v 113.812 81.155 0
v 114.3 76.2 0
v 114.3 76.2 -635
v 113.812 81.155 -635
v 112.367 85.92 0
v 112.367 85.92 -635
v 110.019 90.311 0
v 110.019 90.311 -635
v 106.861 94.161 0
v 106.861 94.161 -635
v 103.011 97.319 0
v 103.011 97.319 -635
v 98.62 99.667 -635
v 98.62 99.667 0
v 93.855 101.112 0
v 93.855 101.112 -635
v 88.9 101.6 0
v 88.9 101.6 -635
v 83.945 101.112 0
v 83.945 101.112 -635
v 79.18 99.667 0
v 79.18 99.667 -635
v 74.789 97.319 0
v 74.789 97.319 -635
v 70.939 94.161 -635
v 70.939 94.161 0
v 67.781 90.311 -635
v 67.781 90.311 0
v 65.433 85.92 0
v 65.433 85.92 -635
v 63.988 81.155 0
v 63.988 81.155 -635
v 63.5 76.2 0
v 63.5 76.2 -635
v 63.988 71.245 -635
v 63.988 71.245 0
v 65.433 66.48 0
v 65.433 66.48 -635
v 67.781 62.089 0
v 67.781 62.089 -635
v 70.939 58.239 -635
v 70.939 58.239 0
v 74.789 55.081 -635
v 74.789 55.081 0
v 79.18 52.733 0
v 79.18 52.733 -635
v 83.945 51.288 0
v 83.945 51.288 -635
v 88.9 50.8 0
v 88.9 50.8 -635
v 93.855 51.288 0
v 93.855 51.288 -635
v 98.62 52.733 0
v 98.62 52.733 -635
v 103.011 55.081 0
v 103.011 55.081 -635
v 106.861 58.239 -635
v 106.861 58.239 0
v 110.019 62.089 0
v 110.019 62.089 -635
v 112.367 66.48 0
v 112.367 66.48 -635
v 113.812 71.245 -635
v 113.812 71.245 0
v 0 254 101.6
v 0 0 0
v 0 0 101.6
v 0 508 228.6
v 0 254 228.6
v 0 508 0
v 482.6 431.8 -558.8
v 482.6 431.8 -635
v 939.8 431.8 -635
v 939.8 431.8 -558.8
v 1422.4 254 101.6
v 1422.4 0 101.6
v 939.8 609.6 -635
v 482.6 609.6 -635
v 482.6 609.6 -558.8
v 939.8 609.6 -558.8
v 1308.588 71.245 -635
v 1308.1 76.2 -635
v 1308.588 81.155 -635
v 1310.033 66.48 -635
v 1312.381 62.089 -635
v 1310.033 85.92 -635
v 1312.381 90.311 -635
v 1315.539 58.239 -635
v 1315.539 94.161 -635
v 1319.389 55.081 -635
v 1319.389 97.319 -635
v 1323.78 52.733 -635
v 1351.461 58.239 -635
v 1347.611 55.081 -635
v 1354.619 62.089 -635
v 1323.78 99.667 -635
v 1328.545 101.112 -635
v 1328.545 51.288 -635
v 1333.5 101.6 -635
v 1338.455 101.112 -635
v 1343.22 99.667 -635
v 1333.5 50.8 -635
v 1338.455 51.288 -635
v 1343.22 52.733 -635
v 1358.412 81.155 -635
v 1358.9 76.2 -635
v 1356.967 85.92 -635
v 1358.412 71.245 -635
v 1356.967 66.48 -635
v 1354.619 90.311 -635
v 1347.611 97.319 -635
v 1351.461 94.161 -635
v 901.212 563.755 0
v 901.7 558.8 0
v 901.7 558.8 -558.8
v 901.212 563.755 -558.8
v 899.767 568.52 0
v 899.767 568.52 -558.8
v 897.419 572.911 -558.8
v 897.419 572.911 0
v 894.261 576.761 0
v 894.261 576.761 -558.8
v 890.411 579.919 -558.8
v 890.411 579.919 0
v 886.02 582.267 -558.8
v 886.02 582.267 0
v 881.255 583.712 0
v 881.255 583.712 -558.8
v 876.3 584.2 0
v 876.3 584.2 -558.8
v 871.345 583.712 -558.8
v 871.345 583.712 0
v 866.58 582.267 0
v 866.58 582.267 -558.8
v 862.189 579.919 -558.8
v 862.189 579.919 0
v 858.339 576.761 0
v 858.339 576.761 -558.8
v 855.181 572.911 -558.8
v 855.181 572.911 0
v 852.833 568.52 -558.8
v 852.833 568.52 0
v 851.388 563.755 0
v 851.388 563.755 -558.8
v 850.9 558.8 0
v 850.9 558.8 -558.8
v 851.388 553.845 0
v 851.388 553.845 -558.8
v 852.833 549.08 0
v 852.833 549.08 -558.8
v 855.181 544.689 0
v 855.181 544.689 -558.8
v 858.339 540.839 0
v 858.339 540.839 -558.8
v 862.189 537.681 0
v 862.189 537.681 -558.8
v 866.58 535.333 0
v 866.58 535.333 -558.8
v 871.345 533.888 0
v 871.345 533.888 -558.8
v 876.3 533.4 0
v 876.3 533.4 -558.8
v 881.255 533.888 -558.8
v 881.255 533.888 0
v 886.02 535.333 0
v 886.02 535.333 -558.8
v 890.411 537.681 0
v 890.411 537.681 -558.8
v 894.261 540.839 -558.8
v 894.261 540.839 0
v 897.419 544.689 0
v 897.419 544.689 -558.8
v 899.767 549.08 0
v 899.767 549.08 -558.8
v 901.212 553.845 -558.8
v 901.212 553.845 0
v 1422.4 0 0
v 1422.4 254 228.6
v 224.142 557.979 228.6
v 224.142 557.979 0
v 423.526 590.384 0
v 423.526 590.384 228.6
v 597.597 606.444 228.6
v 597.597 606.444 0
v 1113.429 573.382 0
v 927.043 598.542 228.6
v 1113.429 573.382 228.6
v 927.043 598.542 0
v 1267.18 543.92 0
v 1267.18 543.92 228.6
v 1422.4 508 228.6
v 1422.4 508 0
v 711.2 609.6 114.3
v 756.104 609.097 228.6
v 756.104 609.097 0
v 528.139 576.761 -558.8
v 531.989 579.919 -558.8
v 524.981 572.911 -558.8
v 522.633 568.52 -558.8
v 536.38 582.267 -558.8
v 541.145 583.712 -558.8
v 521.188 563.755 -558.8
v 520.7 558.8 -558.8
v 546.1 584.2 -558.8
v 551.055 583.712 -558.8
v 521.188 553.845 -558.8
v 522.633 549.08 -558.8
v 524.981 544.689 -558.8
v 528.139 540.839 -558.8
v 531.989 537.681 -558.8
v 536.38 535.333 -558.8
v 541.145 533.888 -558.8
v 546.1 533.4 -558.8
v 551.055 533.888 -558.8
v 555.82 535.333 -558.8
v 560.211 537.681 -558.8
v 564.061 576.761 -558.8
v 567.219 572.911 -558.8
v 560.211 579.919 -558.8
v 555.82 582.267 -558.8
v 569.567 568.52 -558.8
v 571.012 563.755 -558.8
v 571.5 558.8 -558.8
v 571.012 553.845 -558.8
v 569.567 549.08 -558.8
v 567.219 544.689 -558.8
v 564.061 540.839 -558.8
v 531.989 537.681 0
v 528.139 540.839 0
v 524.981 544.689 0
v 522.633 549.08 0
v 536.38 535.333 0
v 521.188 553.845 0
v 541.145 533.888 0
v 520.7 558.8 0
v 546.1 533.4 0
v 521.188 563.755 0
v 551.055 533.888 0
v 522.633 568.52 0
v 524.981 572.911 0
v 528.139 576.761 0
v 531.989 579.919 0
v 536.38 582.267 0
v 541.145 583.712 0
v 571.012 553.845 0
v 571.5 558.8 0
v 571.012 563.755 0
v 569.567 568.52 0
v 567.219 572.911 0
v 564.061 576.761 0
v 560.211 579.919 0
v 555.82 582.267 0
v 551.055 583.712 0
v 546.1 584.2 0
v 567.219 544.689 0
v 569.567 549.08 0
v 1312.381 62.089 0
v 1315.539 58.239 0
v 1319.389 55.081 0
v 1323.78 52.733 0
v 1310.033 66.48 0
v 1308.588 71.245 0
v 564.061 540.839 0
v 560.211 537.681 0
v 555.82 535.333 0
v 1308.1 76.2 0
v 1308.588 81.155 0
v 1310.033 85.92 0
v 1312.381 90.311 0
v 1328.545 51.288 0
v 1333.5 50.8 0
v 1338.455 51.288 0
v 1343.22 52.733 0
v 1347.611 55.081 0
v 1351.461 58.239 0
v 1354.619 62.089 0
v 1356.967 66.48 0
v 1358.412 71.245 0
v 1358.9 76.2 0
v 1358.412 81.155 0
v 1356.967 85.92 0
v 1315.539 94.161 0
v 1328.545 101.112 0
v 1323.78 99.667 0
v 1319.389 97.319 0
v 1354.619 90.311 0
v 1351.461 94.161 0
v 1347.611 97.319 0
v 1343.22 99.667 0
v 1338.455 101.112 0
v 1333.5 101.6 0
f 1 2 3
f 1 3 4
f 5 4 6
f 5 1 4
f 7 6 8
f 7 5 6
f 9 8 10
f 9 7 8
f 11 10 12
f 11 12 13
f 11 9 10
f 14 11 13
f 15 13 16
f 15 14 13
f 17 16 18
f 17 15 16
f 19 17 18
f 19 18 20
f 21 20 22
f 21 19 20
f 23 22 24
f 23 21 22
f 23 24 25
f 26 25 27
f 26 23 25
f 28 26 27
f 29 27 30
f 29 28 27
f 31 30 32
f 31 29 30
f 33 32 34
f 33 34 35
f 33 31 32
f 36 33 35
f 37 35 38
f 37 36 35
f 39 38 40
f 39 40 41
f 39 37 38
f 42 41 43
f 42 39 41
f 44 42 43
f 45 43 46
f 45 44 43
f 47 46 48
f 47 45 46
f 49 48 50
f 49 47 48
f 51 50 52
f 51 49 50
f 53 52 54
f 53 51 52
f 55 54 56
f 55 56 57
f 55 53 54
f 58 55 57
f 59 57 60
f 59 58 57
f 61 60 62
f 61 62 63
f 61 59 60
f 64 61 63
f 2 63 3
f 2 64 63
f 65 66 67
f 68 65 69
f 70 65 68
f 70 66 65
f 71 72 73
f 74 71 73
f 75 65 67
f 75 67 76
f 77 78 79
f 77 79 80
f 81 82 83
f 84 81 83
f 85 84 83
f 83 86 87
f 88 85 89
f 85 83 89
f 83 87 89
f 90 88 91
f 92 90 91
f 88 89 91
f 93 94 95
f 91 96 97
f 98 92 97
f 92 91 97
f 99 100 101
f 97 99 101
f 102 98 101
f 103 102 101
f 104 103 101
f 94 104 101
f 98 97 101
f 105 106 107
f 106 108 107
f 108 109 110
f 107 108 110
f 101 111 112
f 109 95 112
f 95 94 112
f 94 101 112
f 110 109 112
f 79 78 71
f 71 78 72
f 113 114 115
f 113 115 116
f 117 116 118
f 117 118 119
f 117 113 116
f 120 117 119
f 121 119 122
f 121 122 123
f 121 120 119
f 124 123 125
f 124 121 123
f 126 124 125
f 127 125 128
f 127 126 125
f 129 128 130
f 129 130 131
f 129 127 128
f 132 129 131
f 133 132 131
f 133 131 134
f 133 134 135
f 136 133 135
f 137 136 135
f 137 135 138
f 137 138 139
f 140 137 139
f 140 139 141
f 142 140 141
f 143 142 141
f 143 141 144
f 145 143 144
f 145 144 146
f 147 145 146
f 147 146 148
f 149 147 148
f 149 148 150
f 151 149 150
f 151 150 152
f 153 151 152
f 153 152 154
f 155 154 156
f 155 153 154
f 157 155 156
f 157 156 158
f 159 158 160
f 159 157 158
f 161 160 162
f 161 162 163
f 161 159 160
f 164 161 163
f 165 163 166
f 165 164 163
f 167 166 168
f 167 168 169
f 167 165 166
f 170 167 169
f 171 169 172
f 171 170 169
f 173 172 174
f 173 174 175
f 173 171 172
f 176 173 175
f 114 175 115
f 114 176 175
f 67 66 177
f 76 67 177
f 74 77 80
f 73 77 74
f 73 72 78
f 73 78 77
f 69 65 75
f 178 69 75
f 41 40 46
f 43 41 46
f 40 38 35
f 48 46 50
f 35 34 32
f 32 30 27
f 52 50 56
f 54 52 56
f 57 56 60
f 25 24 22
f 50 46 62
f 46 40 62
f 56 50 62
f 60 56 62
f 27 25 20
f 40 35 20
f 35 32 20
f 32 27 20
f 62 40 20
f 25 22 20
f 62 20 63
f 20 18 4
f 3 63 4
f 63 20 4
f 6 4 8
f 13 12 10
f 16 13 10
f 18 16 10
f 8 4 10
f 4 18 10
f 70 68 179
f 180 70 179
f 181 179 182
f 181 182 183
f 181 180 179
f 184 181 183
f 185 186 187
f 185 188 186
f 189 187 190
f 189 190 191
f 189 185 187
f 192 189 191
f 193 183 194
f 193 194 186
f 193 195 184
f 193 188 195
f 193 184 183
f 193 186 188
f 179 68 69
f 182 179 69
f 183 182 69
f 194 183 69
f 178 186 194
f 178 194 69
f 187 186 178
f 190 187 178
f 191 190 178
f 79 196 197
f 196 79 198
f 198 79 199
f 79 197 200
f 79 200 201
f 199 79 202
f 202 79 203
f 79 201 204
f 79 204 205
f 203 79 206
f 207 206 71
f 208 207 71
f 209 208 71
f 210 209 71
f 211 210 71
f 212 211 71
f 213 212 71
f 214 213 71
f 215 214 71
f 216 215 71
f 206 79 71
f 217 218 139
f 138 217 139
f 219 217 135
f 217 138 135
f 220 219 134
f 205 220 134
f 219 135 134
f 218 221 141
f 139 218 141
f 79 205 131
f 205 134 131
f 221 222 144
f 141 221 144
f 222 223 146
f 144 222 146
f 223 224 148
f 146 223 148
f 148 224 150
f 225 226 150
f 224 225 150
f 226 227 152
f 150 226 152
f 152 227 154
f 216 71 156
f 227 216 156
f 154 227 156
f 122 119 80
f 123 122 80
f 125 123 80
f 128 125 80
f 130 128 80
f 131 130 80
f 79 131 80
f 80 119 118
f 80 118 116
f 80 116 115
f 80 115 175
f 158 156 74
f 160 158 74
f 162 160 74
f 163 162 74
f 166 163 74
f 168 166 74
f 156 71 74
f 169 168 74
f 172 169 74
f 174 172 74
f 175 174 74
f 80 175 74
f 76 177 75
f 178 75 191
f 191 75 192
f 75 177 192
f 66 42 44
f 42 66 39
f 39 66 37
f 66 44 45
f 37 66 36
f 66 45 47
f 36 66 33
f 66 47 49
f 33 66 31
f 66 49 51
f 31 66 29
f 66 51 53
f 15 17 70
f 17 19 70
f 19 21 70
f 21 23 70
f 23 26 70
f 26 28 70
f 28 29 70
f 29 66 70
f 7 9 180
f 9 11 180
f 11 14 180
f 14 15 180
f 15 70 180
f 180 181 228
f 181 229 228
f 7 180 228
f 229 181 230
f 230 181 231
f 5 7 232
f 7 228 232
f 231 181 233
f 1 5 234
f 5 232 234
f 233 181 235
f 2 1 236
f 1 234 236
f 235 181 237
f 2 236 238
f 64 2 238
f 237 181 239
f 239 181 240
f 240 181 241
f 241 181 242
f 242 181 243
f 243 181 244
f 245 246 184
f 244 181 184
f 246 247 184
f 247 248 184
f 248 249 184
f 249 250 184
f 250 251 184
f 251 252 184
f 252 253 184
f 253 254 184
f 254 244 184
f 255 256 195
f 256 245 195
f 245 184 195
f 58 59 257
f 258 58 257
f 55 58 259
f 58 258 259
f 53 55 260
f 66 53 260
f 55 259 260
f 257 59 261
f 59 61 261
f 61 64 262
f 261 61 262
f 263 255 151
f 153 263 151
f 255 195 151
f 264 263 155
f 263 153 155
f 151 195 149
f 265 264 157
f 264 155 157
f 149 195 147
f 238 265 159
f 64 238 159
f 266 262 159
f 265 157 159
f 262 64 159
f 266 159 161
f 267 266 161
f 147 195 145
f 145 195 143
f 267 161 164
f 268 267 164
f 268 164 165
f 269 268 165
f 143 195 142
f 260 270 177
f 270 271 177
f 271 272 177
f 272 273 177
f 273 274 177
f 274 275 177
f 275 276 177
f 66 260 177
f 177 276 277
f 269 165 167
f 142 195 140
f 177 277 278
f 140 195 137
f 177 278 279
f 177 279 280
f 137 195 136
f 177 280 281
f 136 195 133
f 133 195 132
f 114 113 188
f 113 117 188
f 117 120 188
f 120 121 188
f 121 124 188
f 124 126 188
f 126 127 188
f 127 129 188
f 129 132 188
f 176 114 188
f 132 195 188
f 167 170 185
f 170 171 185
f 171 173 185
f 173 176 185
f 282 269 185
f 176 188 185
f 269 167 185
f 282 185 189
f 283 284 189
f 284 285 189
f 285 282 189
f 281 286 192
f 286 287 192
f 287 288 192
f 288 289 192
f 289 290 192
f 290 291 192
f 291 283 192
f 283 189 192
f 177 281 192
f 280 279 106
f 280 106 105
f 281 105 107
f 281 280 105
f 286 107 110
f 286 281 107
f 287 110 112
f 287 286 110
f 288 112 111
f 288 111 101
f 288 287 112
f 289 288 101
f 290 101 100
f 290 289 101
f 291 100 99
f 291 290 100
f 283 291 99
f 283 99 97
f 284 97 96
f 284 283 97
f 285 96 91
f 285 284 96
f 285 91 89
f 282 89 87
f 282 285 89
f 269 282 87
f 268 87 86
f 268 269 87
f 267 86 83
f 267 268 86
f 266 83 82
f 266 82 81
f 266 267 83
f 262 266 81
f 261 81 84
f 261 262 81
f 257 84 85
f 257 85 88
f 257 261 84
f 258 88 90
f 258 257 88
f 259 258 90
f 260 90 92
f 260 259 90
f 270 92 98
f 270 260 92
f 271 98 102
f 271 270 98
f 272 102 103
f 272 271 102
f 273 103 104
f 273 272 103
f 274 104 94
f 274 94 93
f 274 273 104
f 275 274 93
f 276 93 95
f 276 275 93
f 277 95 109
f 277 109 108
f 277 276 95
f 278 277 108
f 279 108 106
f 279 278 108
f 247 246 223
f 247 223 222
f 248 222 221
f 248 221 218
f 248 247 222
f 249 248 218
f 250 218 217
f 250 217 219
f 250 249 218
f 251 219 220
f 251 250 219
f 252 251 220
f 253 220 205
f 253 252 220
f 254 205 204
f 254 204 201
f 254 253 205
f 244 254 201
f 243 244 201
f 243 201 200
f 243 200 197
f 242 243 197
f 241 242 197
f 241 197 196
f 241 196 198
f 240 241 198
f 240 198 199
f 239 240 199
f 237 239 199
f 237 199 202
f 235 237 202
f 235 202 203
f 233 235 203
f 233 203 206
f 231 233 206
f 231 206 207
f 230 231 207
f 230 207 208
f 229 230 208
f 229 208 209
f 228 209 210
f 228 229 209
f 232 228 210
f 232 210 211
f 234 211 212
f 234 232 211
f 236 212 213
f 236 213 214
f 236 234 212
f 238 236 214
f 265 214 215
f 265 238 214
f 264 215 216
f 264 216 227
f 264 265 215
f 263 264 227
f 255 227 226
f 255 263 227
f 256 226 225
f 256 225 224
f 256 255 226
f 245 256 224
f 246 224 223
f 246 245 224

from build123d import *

# Parameters (mm, degrees)
F0_R     = 25.4
F1_DEPTH = 228.6
F0_W     = 1422.4
F0_H     = 254
F2_DEPTH = 101.6
F3_DEPTH = 635
F4_W     = 457.2
F4_H     = 177.8
F5_DEPTH = 76.2


with BuildPart() as f1:
    # F0 (on Top) → F1 (new body)
    with BuildSketch(Plane.XY):
        with BuildLine():
            Line((0, 508), (0, 254))
            Line((0, 254), (1422.4, 254))
            Line((1422.4, 254), (1422.4, 508))
            add(Edge.make_bspline(
                [(0, 508), (241.551548, 567.851314), (711.2, 651.348686), (1180.848452, 567.851314), (1422.4, 508)],
                knots=[0, 0, 0, 0, 718.42049, 1436.840979, 1436.840979, 1436.840979, 1436.840979], degree=3))
        make_face()
        with Locations((546.1, 558.8)):
            Circle(F0_R, mode=Mode.SUBTRACT)
        with Locations((876.3, 558.8)):
            Circle(F0_R, mode=Mode.SUBTRACT)
        with Locations((546.1, 558.8)):
            Circle(F0_R)
        with Locations((876.3, 558.8)):
            Circle(F0_R)
    extrude(amount=F1_DEPTH)

    # F0 (on Top) → F2 (join)
    with BuildSketch(Plane.XY):
        with Locations((711.2, 127)):
            Rectangle(F0_W, F0_H)
        with Locations((88.9, 76.2)):
            Circle(F0_R, mode=Mode.SUBTRACT)
        with Locations((1333.5, 76.2)):
            Circle(F0_R, mode=Mode.SUBTRACT)
        with Locations((88.9, 76.2)):
            Circle(F0_R)
        with Locations((1333.5, 76.2)):
            Circle(F0_R)
    extrude(amount=F2_DEPTH)

    # F0 (on Top) → F3 (join)
    with BuildSketch(Plane.XY):
        with Locations((876.3, 558.8)):
            Circle(F0_R)
        with Locations((546.1, 558.8)):
            Circle(F0_R)
        with Locations((1333.5, 76.2)):
            Circle(F0_R)
        with Locations((88.9, 76.2)):
            Circle(F0_R)
    extrude(amount=-F3_DEPTH)

    # F4 (on face) → F5 (join)
    with BuildSketch(Plane(origin=(0, 0, -635), x_dir=(1, 0, 0), z_dir=(0, 0, -1))):
        with Locations((711.2, -520.7)):
            Rectangle(F4_W, F4_H)
    extrude(amount=-F5_DEPTH)


solid = f1.part
